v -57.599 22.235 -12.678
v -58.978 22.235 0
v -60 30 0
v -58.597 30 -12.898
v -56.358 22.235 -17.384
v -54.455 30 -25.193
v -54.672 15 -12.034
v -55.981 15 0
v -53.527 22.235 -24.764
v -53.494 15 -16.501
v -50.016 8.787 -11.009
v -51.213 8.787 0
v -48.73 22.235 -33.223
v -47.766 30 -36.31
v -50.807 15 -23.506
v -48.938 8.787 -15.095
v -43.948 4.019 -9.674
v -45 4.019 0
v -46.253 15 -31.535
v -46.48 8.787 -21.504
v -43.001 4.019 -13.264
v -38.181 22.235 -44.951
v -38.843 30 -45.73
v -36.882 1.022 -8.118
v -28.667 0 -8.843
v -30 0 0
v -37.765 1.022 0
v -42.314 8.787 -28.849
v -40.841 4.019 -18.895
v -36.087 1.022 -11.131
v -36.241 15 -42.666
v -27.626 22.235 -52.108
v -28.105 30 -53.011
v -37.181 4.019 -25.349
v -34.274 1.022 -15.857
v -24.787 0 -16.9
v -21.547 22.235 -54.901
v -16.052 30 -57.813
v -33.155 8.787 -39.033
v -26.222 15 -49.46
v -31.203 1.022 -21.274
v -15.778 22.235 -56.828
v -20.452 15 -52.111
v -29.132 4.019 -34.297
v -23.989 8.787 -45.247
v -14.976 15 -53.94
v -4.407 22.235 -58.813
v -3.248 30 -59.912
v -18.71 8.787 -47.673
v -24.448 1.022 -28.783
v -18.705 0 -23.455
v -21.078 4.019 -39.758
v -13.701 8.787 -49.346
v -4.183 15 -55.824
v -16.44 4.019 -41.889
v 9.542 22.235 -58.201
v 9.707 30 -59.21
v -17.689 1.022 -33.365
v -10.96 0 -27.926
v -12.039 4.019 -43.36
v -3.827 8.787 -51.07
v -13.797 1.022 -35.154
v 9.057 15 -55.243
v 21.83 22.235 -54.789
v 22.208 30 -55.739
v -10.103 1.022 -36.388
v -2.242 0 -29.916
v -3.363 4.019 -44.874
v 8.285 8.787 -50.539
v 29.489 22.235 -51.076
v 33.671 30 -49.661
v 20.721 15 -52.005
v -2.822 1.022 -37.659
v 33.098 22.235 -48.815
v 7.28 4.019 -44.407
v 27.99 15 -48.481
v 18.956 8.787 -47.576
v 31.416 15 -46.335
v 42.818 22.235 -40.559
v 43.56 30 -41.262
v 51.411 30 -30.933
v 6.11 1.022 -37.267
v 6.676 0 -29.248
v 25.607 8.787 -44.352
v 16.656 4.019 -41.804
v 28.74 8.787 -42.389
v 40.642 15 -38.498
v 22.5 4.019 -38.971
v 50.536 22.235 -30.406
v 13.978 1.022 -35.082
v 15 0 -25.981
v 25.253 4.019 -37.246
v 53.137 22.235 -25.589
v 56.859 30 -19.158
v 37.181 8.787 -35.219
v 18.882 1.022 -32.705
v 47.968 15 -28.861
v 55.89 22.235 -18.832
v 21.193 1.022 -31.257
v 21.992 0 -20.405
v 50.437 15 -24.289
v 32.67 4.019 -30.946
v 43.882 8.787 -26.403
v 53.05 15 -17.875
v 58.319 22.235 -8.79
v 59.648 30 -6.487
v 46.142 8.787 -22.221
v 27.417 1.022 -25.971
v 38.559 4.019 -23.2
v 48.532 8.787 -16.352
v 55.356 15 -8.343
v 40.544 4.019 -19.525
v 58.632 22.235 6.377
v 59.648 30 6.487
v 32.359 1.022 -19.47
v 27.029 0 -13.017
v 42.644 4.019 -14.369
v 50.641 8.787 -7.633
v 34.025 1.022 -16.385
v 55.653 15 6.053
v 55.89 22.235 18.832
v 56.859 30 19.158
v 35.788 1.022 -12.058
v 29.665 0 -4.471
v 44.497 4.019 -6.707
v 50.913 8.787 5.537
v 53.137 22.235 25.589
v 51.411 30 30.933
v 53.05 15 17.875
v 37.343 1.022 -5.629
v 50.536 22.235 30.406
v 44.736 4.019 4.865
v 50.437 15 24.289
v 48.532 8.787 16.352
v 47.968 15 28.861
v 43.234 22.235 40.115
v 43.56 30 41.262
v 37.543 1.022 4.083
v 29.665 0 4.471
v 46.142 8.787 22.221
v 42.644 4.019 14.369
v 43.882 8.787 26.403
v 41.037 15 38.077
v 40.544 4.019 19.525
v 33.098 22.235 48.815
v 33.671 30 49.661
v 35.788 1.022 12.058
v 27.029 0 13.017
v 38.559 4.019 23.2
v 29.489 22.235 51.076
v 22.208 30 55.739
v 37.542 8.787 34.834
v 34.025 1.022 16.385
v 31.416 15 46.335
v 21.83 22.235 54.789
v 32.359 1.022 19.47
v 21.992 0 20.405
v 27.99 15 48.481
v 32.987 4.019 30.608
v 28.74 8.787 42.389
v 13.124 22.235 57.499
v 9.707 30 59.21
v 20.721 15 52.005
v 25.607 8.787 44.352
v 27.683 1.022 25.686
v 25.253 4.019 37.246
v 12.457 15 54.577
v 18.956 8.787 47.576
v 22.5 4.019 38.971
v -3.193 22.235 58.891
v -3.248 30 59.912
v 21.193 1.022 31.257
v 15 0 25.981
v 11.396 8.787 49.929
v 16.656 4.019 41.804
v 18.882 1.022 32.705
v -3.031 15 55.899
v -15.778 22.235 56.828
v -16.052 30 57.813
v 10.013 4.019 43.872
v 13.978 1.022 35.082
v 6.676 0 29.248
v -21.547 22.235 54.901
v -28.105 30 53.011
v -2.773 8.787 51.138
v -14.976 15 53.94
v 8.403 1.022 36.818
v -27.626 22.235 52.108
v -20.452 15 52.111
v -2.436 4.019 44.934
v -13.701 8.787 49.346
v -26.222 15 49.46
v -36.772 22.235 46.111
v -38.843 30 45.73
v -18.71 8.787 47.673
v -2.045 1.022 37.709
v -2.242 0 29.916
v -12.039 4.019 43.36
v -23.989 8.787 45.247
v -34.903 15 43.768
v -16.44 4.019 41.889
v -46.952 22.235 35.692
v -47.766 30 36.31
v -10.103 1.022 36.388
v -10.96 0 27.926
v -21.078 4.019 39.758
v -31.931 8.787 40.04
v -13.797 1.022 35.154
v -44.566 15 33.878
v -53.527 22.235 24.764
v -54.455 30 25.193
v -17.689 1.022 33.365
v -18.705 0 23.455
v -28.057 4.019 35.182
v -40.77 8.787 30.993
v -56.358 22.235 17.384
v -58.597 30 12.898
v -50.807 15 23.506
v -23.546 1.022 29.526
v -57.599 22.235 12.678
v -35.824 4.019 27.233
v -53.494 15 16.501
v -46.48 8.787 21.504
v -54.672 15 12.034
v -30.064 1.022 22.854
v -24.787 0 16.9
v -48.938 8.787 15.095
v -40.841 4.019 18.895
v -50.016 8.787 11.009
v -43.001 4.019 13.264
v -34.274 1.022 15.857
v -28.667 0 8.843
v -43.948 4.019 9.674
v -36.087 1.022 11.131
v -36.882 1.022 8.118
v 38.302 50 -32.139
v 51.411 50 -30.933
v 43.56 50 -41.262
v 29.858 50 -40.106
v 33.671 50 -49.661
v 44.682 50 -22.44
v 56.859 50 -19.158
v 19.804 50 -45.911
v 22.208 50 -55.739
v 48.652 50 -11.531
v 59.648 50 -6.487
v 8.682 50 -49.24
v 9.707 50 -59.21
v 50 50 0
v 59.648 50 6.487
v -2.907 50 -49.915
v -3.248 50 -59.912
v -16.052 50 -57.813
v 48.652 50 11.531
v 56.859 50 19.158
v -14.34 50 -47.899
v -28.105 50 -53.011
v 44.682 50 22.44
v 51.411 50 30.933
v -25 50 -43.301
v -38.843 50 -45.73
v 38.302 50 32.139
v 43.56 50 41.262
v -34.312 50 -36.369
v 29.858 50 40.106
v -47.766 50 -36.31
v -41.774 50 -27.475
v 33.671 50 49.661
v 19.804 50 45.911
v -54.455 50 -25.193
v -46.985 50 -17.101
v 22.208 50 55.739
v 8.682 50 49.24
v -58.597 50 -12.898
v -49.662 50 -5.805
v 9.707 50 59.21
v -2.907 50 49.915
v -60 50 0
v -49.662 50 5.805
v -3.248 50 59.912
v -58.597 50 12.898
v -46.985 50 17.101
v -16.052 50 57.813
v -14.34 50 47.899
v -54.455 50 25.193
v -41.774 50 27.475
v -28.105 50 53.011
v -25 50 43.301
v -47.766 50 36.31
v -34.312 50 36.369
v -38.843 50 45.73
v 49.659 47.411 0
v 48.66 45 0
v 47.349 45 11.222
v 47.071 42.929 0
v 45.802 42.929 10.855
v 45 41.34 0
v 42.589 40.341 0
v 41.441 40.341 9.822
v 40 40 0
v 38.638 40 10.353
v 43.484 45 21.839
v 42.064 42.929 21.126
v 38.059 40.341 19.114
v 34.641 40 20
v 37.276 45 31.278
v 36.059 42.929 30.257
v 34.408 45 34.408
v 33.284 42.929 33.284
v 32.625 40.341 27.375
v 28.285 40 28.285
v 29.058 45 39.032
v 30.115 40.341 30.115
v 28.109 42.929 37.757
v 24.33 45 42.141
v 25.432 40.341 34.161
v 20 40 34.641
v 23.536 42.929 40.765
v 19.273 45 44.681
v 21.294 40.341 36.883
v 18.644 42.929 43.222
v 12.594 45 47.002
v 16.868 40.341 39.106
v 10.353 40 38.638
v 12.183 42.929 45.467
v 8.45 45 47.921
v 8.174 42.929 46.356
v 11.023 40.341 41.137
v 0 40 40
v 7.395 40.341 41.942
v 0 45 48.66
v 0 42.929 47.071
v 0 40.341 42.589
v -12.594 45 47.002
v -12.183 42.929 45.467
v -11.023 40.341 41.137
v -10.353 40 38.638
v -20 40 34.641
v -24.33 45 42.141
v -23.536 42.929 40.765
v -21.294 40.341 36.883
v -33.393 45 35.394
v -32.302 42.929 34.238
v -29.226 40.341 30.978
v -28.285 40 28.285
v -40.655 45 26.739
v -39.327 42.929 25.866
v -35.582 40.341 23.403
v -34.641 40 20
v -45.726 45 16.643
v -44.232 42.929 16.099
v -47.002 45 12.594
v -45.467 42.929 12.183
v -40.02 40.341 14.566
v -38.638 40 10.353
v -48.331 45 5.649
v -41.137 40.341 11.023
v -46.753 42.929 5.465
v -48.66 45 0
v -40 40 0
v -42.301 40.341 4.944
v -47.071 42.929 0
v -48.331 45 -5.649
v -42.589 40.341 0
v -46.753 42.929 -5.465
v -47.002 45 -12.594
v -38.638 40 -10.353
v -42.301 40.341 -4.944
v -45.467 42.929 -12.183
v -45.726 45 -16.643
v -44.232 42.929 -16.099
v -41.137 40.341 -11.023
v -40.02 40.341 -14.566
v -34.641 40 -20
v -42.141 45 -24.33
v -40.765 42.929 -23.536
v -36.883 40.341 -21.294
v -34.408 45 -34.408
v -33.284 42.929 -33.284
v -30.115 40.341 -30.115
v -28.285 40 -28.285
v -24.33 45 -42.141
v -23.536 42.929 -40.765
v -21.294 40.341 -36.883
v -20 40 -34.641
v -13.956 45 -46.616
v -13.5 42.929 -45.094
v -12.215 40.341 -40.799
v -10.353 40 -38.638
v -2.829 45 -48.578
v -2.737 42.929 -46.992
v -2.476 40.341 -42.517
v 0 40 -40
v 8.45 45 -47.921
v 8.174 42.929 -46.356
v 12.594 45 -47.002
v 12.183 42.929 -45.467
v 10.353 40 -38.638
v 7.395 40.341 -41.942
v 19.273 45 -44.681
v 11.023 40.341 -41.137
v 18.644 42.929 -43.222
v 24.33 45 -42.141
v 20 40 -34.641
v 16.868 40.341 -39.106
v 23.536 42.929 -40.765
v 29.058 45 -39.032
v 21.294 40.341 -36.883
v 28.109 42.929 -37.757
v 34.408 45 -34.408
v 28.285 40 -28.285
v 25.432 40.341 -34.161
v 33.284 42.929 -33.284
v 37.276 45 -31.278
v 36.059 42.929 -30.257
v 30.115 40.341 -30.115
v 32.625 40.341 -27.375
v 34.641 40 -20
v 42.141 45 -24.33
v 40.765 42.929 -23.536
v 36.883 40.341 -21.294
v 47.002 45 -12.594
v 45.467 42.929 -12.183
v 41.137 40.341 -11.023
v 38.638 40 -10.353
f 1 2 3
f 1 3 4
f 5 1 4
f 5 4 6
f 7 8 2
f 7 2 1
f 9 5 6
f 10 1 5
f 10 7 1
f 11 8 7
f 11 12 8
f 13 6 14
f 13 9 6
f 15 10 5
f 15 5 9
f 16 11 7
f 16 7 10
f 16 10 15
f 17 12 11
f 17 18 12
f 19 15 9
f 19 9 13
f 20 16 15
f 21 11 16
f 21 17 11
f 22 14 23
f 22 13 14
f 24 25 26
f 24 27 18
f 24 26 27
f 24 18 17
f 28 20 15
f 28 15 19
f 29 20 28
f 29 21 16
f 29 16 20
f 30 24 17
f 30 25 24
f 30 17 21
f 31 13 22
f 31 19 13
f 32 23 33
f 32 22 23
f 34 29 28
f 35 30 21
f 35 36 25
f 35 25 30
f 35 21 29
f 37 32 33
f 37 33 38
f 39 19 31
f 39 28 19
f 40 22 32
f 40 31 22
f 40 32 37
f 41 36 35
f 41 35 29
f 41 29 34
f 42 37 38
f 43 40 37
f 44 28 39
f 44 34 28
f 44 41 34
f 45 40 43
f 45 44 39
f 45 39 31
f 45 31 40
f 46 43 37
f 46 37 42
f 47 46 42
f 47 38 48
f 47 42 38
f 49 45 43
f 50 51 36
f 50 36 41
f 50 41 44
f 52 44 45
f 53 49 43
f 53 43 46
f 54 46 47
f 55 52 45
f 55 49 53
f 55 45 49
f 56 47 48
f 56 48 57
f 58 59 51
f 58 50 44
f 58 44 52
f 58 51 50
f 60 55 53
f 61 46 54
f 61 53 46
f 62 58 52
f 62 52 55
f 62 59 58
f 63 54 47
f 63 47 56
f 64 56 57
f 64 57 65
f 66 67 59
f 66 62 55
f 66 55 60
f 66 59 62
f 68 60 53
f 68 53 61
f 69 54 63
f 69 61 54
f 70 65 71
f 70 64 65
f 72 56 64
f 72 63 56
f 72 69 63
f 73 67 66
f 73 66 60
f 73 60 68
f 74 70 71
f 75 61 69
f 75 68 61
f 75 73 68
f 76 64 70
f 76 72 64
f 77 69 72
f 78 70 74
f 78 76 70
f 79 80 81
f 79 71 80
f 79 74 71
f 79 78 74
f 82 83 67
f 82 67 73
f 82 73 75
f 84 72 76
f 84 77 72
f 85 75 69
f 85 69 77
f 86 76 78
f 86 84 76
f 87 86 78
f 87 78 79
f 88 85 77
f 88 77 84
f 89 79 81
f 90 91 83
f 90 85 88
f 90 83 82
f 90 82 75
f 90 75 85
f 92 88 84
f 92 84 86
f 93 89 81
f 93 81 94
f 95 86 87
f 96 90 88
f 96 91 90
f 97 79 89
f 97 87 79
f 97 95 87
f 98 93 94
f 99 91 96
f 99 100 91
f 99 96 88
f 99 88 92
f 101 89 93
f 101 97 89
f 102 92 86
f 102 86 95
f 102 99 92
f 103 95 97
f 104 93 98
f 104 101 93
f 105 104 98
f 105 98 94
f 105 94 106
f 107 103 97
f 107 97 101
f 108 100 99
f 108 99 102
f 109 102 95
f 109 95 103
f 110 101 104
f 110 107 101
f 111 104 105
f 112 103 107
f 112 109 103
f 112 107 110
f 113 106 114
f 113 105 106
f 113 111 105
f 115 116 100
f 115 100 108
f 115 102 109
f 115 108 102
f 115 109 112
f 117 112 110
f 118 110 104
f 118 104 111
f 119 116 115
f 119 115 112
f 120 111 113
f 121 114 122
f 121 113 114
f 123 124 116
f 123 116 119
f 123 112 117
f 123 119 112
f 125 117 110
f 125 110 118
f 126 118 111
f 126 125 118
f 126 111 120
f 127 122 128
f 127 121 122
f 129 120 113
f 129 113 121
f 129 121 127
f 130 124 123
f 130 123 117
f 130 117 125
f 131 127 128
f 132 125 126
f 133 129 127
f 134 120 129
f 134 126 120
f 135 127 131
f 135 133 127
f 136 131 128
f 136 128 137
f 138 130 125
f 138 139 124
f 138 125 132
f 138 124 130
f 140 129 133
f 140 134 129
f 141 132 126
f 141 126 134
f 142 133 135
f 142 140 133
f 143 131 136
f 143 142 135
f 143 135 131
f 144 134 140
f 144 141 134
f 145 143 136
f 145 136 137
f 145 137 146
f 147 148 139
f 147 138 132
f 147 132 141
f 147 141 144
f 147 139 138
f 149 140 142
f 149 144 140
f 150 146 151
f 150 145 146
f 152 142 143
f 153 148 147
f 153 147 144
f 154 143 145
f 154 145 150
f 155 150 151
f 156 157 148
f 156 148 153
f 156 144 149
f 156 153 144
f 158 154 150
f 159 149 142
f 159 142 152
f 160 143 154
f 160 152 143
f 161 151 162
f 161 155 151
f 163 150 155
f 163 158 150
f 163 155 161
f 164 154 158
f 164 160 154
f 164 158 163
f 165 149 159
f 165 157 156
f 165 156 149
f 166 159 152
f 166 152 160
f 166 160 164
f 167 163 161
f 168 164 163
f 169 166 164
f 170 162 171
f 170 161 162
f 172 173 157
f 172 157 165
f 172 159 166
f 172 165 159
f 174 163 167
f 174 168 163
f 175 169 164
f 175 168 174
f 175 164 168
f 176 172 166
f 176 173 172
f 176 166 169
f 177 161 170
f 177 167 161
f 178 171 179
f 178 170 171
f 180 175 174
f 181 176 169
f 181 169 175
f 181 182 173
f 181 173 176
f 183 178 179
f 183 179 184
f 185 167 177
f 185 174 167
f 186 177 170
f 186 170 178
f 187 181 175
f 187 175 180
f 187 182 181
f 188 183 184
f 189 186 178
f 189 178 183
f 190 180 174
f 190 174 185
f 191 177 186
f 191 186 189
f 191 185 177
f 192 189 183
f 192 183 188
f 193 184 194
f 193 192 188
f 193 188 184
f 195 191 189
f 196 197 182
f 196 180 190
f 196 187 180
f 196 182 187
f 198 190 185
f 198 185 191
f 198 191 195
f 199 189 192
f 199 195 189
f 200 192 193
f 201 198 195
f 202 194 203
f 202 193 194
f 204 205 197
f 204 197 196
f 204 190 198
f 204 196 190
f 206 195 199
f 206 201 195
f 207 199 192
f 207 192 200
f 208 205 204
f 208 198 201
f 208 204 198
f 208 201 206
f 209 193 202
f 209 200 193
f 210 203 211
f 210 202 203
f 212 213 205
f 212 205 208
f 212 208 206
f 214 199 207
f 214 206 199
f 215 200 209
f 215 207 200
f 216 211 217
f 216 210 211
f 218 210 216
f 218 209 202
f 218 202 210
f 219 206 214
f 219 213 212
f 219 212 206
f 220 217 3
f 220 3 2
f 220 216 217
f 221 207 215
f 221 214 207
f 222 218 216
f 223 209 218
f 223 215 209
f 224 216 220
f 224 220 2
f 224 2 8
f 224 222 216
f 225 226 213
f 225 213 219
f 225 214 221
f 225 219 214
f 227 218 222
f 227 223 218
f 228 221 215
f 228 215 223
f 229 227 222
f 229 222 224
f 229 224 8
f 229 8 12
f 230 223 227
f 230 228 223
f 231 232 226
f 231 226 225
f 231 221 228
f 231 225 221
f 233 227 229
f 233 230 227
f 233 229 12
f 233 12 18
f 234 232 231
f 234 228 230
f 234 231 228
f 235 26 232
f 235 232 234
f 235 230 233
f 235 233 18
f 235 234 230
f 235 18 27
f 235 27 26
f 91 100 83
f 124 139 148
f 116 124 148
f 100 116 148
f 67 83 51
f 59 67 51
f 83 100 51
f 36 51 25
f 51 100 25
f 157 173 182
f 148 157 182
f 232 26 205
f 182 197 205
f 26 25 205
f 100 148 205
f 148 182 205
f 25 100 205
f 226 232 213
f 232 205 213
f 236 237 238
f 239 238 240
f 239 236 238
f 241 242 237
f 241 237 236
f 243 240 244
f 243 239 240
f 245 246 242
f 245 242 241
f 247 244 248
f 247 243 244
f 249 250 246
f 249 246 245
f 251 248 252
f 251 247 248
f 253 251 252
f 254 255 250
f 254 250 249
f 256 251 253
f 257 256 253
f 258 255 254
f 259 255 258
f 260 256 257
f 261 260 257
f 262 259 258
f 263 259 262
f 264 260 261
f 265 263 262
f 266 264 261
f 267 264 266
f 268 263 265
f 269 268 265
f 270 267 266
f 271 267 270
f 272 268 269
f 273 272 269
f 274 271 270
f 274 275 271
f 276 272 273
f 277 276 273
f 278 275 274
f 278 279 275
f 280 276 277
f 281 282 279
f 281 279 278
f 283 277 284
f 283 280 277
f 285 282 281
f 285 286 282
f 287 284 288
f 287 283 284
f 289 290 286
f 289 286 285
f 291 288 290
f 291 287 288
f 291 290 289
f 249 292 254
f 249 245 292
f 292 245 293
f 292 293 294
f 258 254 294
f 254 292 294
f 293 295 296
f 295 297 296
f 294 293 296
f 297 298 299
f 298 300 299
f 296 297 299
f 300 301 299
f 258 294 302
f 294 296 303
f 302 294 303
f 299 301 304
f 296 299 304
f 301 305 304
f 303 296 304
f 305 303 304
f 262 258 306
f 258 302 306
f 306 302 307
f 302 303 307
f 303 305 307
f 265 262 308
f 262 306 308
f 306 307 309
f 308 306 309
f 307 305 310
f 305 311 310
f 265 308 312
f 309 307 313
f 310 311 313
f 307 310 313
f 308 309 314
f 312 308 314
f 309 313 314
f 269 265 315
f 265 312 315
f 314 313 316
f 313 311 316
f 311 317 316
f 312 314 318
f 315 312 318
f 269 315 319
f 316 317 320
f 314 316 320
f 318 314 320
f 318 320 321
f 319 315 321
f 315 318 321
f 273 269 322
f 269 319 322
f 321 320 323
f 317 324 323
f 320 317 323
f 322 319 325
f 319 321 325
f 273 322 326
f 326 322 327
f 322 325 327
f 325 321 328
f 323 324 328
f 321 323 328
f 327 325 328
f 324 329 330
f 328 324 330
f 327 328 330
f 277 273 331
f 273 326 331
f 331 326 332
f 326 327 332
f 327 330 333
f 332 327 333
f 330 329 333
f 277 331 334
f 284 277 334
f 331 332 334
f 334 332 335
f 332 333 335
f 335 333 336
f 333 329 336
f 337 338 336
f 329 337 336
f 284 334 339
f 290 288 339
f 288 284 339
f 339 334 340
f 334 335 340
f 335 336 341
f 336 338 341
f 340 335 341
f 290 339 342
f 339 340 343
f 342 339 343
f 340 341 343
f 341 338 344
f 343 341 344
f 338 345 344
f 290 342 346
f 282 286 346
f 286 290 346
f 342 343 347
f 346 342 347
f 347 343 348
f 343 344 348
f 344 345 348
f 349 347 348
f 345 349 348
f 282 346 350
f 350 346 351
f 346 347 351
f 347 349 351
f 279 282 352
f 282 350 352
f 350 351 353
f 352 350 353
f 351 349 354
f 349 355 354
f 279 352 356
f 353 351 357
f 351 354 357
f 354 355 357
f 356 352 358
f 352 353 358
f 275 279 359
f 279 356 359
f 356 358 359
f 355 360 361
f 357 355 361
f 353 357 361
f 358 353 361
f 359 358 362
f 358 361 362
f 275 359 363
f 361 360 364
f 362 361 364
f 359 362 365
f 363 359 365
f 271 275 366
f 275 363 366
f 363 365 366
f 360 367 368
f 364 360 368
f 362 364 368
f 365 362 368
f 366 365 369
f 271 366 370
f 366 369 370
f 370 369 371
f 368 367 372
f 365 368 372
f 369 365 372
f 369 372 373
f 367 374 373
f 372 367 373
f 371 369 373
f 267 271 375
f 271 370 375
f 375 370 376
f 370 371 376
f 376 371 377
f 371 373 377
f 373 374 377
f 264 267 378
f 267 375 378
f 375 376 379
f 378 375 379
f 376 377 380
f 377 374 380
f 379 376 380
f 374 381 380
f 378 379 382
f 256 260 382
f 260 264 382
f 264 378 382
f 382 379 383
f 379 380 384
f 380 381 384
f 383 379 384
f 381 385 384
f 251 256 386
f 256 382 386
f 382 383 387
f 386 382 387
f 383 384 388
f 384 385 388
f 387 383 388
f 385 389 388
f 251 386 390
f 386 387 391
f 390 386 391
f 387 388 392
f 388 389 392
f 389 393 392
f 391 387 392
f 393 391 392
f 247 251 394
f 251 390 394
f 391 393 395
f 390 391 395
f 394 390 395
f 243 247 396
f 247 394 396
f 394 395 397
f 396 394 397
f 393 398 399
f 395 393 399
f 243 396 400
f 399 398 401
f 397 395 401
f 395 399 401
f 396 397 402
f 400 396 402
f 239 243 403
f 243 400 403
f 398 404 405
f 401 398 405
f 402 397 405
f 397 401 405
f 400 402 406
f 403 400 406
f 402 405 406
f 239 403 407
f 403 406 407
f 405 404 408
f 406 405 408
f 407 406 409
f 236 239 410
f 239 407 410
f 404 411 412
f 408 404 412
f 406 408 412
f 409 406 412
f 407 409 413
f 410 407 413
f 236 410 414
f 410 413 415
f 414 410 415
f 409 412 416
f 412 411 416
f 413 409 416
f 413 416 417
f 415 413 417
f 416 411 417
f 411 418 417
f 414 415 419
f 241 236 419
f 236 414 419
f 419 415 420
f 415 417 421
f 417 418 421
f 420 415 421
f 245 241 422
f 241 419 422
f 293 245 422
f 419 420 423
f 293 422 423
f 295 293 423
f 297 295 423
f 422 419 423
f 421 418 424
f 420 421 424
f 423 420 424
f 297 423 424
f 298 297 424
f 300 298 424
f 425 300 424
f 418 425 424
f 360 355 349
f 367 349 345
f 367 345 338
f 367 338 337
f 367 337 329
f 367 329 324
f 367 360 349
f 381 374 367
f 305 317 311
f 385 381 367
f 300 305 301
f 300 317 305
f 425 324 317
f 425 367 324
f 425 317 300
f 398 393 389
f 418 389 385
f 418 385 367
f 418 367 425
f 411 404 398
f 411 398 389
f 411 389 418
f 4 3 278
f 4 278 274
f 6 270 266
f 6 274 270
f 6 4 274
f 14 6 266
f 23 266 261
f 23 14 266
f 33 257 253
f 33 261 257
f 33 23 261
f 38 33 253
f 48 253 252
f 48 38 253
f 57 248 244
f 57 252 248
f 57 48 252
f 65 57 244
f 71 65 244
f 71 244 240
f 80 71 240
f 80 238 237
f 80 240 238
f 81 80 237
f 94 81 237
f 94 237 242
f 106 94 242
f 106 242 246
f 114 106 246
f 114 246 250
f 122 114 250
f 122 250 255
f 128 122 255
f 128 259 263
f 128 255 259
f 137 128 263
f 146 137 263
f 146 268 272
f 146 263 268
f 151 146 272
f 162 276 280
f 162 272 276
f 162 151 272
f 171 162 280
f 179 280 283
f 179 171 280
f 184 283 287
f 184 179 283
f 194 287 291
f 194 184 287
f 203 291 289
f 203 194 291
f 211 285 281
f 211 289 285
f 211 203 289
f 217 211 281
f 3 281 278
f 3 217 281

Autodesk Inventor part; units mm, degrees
ref_plane "YZ Plane" through (0, 0, 0) normal (1, 0, 0) x (0, 1, 0)
ref_plane "XZ Plane" through (0, 0, 0) normal (0, 1, 0) x (-1, 0, 0)
ref_plane "XY Plane" through (0, 0, 0) normal (0, 0, 1) x (1, 0, 0)
sketch "Sketch1" plane through (0, 0, 0) normal (0, 1, 0) x (-1, 0, 0)
  circle A0 centre (0, 0) radius 60
  dimension "d0" = 120
extrude "Extrusion1" add sketch "Sketch1" along normal blind 50
sketch "Sketch2" plane through (0, 50, 0) normal (0, 1, 0) x (1, 0, 0)
  circle A0 centre (0, 0) radius 50
  dimension "d3" = 100
extrude "Extrusion2" cut sketch "Sketch2" against normal blind 10
fillet "Fillet1" radius 10 1 edges at (-50, 40, 0)
fillet "Fillet2" radius 30 1 edges at (60, 0, 0)
sketch "Sketch3" plane through (0, 0, 0) normal (1, 0, 0) x (0, 1, 0)
  point P0 (0, 0)
properties part number "cylinder_head"
